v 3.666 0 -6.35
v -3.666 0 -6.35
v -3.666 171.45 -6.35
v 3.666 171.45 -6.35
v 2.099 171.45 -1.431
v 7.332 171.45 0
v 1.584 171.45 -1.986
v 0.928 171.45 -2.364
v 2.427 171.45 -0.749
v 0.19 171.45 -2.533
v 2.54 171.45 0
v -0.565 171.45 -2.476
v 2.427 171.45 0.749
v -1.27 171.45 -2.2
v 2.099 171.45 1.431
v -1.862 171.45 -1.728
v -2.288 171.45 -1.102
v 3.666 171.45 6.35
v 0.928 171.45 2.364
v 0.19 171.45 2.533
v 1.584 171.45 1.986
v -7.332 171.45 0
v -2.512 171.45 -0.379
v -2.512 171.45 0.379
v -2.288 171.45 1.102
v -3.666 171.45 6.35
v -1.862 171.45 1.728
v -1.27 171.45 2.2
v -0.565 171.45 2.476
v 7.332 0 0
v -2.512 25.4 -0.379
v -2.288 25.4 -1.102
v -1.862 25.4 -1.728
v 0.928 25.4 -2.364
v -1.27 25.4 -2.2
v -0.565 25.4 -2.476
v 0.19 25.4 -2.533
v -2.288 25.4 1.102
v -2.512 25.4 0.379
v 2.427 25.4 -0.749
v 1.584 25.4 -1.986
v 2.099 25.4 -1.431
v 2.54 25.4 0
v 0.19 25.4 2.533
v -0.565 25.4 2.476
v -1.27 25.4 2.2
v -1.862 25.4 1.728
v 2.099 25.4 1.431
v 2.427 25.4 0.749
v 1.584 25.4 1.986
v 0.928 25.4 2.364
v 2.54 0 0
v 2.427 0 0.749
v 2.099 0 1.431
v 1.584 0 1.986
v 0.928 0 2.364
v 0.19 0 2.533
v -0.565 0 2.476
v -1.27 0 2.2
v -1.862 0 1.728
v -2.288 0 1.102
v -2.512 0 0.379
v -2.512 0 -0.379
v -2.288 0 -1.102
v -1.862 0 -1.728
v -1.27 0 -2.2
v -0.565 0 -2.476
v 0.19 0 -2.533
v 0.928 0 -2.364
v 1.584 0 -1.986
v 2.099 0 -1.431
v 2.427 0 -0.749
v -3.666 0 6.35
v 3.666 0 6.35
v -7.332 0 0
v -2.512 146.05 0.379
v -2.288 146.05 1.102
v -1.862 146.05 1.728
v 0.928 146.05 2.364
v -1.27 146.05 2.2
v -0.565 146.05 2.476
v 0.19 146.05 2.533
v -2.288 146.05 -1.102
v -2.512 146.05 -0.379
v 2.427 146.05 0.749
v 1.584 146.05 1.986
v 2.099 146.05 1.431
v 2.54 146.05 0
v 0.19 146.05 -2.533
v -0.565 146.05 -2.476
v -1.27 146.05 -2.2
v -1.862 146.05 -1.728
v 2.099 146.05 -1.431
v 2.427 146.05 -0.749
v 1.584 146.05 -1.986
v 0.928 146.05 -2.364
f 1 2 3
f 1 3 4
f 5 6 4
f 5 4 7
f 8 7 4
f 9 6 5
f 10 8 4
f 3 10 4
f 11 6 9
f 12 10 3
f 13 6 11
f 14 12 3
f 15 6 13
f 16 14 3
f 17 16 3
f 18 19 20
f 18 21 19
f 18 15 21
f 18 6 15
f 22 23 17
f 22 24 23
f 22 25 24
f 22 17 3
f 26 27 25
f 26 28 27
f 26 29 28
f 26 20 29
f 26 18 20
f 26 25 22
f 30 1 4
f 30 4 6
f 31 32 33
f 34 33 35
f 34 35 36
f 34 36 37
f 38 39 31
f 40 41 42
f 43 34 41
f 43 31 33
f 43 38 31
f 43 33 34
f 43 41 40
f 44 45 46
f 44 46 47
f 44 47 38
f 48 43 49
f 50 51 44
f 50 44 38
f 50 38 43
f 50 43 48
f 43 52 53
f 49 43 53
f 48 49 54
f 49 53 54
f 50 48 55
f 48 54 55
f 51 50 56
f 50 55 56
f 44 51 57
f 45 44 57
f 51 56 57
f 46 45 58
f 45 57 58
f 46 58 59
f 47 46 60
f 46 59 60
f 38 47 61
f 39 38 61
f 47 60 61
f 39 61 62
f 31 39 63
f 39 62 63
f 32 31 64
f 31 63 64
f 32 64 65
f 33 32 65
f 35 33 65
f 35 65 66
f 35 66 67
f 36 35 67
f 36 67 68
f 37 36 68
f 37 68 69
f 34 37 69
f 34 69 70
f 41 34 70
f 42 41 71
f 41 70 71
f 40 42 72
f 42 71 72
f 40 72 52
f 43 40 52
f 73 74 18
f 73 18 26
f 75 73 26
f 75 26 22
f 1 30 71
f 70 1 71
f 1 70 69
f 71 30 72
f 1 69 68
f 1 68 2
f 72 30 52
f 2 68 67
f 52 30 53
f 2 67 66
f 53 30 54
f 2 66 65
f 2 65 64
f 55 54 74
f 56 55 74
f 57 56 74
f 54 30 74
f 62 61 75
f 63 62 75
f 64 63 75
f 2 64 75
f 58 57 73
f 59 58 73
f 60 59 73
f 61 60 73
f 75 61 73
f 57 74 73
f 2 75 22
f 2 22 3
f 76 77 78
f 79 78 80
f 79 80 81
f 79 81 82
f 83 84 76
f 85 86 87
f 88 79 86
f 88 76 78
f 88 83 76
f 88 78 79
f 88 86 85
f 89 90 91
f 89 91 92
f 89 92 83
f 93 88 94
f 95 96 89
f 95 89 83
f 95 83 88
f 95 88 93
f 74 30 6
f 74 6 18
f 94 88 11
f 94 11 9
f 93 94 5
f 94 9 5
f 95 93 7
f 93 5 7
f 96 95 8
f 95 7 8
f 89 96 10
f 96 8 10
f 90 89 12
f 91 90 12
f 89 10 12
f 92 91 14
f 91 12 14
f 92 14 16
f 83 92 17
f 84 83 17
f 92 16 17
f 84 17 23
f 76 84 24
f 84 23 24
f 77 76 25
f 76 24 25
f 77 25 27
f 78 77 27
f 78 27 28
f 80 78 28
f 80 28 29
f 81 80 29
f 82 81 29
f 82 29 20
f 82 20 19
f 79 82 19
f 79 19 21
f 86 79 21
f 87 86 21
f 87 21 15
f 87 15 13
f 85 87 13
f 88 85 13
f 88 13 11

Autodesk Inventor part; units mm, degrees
ref_plane "YZ Plane" through (0, 0, 0) normal (1, 0, 0) x (0, 1, 0)
ref_plane "XZ Plane" through (0, 0, 0) normal (0, 1, 0) x (-1, 0, 0)
ref_plane "XY Plane" through (0, 0, 0) normal (0, 0, 1) x (1, 0, 0)
sketch "Sketch1" plane through (0, 0, 0) normal (0, 1, 0) x (-1, 0, 0)
  line L0 (-3.6662, 6.35) -> (3.6662, 6.35)
  line L1 (3.6662, 6.35) -> (7.3323, 0)
  line L2 (7.3323, 0) -> (3.6662, -6.35)
  line L3 (3.6662, -6.35) -> (-3.6662, -6.35)
  line L4 (-3.6662, -6.35) -> (-7.3323, 0)
  line L5 (-7.3323, 0) -> (-3.6662, 6.35)
  point P0 (0, 0)
  point P1 (0, 0)
  dimension "d0" = 12.7
extrude "Extrusion1" add sketch "Sketch1" along normal blind 171.45
sketch "Sketch2" plane through (0, 171.45, 0) normal (0, 1, 0) x (1, 0, 0)
  circle A0 centre (0, 0) radius 2.54
  dimension "d3" = 5.08
extrude "Extrusion2" cut sketch "Sketch2" against normal blind 25.4
thread "Thread1" size "1/4-20 UNC" class "2B" standard "ANSI Unified Screw Threads" full length
sketch "Sketch3" plane through (0, 0, 0) normal (0, -1, 0) x (1, 0, 0)
  circle A0 centre (0, 0) radius 2.54
  dimension "d8" = 5.08
extrude "Extrusion3" cut sketch "Sketch3" against normal blind 25.4
thread "Thread2" size "1/4-20 UNC" class "2B" standard "ANSI Unified Screw Threads" full length
properties part number "OUTK_013_Shaft1" material "Aluminum 6061"
